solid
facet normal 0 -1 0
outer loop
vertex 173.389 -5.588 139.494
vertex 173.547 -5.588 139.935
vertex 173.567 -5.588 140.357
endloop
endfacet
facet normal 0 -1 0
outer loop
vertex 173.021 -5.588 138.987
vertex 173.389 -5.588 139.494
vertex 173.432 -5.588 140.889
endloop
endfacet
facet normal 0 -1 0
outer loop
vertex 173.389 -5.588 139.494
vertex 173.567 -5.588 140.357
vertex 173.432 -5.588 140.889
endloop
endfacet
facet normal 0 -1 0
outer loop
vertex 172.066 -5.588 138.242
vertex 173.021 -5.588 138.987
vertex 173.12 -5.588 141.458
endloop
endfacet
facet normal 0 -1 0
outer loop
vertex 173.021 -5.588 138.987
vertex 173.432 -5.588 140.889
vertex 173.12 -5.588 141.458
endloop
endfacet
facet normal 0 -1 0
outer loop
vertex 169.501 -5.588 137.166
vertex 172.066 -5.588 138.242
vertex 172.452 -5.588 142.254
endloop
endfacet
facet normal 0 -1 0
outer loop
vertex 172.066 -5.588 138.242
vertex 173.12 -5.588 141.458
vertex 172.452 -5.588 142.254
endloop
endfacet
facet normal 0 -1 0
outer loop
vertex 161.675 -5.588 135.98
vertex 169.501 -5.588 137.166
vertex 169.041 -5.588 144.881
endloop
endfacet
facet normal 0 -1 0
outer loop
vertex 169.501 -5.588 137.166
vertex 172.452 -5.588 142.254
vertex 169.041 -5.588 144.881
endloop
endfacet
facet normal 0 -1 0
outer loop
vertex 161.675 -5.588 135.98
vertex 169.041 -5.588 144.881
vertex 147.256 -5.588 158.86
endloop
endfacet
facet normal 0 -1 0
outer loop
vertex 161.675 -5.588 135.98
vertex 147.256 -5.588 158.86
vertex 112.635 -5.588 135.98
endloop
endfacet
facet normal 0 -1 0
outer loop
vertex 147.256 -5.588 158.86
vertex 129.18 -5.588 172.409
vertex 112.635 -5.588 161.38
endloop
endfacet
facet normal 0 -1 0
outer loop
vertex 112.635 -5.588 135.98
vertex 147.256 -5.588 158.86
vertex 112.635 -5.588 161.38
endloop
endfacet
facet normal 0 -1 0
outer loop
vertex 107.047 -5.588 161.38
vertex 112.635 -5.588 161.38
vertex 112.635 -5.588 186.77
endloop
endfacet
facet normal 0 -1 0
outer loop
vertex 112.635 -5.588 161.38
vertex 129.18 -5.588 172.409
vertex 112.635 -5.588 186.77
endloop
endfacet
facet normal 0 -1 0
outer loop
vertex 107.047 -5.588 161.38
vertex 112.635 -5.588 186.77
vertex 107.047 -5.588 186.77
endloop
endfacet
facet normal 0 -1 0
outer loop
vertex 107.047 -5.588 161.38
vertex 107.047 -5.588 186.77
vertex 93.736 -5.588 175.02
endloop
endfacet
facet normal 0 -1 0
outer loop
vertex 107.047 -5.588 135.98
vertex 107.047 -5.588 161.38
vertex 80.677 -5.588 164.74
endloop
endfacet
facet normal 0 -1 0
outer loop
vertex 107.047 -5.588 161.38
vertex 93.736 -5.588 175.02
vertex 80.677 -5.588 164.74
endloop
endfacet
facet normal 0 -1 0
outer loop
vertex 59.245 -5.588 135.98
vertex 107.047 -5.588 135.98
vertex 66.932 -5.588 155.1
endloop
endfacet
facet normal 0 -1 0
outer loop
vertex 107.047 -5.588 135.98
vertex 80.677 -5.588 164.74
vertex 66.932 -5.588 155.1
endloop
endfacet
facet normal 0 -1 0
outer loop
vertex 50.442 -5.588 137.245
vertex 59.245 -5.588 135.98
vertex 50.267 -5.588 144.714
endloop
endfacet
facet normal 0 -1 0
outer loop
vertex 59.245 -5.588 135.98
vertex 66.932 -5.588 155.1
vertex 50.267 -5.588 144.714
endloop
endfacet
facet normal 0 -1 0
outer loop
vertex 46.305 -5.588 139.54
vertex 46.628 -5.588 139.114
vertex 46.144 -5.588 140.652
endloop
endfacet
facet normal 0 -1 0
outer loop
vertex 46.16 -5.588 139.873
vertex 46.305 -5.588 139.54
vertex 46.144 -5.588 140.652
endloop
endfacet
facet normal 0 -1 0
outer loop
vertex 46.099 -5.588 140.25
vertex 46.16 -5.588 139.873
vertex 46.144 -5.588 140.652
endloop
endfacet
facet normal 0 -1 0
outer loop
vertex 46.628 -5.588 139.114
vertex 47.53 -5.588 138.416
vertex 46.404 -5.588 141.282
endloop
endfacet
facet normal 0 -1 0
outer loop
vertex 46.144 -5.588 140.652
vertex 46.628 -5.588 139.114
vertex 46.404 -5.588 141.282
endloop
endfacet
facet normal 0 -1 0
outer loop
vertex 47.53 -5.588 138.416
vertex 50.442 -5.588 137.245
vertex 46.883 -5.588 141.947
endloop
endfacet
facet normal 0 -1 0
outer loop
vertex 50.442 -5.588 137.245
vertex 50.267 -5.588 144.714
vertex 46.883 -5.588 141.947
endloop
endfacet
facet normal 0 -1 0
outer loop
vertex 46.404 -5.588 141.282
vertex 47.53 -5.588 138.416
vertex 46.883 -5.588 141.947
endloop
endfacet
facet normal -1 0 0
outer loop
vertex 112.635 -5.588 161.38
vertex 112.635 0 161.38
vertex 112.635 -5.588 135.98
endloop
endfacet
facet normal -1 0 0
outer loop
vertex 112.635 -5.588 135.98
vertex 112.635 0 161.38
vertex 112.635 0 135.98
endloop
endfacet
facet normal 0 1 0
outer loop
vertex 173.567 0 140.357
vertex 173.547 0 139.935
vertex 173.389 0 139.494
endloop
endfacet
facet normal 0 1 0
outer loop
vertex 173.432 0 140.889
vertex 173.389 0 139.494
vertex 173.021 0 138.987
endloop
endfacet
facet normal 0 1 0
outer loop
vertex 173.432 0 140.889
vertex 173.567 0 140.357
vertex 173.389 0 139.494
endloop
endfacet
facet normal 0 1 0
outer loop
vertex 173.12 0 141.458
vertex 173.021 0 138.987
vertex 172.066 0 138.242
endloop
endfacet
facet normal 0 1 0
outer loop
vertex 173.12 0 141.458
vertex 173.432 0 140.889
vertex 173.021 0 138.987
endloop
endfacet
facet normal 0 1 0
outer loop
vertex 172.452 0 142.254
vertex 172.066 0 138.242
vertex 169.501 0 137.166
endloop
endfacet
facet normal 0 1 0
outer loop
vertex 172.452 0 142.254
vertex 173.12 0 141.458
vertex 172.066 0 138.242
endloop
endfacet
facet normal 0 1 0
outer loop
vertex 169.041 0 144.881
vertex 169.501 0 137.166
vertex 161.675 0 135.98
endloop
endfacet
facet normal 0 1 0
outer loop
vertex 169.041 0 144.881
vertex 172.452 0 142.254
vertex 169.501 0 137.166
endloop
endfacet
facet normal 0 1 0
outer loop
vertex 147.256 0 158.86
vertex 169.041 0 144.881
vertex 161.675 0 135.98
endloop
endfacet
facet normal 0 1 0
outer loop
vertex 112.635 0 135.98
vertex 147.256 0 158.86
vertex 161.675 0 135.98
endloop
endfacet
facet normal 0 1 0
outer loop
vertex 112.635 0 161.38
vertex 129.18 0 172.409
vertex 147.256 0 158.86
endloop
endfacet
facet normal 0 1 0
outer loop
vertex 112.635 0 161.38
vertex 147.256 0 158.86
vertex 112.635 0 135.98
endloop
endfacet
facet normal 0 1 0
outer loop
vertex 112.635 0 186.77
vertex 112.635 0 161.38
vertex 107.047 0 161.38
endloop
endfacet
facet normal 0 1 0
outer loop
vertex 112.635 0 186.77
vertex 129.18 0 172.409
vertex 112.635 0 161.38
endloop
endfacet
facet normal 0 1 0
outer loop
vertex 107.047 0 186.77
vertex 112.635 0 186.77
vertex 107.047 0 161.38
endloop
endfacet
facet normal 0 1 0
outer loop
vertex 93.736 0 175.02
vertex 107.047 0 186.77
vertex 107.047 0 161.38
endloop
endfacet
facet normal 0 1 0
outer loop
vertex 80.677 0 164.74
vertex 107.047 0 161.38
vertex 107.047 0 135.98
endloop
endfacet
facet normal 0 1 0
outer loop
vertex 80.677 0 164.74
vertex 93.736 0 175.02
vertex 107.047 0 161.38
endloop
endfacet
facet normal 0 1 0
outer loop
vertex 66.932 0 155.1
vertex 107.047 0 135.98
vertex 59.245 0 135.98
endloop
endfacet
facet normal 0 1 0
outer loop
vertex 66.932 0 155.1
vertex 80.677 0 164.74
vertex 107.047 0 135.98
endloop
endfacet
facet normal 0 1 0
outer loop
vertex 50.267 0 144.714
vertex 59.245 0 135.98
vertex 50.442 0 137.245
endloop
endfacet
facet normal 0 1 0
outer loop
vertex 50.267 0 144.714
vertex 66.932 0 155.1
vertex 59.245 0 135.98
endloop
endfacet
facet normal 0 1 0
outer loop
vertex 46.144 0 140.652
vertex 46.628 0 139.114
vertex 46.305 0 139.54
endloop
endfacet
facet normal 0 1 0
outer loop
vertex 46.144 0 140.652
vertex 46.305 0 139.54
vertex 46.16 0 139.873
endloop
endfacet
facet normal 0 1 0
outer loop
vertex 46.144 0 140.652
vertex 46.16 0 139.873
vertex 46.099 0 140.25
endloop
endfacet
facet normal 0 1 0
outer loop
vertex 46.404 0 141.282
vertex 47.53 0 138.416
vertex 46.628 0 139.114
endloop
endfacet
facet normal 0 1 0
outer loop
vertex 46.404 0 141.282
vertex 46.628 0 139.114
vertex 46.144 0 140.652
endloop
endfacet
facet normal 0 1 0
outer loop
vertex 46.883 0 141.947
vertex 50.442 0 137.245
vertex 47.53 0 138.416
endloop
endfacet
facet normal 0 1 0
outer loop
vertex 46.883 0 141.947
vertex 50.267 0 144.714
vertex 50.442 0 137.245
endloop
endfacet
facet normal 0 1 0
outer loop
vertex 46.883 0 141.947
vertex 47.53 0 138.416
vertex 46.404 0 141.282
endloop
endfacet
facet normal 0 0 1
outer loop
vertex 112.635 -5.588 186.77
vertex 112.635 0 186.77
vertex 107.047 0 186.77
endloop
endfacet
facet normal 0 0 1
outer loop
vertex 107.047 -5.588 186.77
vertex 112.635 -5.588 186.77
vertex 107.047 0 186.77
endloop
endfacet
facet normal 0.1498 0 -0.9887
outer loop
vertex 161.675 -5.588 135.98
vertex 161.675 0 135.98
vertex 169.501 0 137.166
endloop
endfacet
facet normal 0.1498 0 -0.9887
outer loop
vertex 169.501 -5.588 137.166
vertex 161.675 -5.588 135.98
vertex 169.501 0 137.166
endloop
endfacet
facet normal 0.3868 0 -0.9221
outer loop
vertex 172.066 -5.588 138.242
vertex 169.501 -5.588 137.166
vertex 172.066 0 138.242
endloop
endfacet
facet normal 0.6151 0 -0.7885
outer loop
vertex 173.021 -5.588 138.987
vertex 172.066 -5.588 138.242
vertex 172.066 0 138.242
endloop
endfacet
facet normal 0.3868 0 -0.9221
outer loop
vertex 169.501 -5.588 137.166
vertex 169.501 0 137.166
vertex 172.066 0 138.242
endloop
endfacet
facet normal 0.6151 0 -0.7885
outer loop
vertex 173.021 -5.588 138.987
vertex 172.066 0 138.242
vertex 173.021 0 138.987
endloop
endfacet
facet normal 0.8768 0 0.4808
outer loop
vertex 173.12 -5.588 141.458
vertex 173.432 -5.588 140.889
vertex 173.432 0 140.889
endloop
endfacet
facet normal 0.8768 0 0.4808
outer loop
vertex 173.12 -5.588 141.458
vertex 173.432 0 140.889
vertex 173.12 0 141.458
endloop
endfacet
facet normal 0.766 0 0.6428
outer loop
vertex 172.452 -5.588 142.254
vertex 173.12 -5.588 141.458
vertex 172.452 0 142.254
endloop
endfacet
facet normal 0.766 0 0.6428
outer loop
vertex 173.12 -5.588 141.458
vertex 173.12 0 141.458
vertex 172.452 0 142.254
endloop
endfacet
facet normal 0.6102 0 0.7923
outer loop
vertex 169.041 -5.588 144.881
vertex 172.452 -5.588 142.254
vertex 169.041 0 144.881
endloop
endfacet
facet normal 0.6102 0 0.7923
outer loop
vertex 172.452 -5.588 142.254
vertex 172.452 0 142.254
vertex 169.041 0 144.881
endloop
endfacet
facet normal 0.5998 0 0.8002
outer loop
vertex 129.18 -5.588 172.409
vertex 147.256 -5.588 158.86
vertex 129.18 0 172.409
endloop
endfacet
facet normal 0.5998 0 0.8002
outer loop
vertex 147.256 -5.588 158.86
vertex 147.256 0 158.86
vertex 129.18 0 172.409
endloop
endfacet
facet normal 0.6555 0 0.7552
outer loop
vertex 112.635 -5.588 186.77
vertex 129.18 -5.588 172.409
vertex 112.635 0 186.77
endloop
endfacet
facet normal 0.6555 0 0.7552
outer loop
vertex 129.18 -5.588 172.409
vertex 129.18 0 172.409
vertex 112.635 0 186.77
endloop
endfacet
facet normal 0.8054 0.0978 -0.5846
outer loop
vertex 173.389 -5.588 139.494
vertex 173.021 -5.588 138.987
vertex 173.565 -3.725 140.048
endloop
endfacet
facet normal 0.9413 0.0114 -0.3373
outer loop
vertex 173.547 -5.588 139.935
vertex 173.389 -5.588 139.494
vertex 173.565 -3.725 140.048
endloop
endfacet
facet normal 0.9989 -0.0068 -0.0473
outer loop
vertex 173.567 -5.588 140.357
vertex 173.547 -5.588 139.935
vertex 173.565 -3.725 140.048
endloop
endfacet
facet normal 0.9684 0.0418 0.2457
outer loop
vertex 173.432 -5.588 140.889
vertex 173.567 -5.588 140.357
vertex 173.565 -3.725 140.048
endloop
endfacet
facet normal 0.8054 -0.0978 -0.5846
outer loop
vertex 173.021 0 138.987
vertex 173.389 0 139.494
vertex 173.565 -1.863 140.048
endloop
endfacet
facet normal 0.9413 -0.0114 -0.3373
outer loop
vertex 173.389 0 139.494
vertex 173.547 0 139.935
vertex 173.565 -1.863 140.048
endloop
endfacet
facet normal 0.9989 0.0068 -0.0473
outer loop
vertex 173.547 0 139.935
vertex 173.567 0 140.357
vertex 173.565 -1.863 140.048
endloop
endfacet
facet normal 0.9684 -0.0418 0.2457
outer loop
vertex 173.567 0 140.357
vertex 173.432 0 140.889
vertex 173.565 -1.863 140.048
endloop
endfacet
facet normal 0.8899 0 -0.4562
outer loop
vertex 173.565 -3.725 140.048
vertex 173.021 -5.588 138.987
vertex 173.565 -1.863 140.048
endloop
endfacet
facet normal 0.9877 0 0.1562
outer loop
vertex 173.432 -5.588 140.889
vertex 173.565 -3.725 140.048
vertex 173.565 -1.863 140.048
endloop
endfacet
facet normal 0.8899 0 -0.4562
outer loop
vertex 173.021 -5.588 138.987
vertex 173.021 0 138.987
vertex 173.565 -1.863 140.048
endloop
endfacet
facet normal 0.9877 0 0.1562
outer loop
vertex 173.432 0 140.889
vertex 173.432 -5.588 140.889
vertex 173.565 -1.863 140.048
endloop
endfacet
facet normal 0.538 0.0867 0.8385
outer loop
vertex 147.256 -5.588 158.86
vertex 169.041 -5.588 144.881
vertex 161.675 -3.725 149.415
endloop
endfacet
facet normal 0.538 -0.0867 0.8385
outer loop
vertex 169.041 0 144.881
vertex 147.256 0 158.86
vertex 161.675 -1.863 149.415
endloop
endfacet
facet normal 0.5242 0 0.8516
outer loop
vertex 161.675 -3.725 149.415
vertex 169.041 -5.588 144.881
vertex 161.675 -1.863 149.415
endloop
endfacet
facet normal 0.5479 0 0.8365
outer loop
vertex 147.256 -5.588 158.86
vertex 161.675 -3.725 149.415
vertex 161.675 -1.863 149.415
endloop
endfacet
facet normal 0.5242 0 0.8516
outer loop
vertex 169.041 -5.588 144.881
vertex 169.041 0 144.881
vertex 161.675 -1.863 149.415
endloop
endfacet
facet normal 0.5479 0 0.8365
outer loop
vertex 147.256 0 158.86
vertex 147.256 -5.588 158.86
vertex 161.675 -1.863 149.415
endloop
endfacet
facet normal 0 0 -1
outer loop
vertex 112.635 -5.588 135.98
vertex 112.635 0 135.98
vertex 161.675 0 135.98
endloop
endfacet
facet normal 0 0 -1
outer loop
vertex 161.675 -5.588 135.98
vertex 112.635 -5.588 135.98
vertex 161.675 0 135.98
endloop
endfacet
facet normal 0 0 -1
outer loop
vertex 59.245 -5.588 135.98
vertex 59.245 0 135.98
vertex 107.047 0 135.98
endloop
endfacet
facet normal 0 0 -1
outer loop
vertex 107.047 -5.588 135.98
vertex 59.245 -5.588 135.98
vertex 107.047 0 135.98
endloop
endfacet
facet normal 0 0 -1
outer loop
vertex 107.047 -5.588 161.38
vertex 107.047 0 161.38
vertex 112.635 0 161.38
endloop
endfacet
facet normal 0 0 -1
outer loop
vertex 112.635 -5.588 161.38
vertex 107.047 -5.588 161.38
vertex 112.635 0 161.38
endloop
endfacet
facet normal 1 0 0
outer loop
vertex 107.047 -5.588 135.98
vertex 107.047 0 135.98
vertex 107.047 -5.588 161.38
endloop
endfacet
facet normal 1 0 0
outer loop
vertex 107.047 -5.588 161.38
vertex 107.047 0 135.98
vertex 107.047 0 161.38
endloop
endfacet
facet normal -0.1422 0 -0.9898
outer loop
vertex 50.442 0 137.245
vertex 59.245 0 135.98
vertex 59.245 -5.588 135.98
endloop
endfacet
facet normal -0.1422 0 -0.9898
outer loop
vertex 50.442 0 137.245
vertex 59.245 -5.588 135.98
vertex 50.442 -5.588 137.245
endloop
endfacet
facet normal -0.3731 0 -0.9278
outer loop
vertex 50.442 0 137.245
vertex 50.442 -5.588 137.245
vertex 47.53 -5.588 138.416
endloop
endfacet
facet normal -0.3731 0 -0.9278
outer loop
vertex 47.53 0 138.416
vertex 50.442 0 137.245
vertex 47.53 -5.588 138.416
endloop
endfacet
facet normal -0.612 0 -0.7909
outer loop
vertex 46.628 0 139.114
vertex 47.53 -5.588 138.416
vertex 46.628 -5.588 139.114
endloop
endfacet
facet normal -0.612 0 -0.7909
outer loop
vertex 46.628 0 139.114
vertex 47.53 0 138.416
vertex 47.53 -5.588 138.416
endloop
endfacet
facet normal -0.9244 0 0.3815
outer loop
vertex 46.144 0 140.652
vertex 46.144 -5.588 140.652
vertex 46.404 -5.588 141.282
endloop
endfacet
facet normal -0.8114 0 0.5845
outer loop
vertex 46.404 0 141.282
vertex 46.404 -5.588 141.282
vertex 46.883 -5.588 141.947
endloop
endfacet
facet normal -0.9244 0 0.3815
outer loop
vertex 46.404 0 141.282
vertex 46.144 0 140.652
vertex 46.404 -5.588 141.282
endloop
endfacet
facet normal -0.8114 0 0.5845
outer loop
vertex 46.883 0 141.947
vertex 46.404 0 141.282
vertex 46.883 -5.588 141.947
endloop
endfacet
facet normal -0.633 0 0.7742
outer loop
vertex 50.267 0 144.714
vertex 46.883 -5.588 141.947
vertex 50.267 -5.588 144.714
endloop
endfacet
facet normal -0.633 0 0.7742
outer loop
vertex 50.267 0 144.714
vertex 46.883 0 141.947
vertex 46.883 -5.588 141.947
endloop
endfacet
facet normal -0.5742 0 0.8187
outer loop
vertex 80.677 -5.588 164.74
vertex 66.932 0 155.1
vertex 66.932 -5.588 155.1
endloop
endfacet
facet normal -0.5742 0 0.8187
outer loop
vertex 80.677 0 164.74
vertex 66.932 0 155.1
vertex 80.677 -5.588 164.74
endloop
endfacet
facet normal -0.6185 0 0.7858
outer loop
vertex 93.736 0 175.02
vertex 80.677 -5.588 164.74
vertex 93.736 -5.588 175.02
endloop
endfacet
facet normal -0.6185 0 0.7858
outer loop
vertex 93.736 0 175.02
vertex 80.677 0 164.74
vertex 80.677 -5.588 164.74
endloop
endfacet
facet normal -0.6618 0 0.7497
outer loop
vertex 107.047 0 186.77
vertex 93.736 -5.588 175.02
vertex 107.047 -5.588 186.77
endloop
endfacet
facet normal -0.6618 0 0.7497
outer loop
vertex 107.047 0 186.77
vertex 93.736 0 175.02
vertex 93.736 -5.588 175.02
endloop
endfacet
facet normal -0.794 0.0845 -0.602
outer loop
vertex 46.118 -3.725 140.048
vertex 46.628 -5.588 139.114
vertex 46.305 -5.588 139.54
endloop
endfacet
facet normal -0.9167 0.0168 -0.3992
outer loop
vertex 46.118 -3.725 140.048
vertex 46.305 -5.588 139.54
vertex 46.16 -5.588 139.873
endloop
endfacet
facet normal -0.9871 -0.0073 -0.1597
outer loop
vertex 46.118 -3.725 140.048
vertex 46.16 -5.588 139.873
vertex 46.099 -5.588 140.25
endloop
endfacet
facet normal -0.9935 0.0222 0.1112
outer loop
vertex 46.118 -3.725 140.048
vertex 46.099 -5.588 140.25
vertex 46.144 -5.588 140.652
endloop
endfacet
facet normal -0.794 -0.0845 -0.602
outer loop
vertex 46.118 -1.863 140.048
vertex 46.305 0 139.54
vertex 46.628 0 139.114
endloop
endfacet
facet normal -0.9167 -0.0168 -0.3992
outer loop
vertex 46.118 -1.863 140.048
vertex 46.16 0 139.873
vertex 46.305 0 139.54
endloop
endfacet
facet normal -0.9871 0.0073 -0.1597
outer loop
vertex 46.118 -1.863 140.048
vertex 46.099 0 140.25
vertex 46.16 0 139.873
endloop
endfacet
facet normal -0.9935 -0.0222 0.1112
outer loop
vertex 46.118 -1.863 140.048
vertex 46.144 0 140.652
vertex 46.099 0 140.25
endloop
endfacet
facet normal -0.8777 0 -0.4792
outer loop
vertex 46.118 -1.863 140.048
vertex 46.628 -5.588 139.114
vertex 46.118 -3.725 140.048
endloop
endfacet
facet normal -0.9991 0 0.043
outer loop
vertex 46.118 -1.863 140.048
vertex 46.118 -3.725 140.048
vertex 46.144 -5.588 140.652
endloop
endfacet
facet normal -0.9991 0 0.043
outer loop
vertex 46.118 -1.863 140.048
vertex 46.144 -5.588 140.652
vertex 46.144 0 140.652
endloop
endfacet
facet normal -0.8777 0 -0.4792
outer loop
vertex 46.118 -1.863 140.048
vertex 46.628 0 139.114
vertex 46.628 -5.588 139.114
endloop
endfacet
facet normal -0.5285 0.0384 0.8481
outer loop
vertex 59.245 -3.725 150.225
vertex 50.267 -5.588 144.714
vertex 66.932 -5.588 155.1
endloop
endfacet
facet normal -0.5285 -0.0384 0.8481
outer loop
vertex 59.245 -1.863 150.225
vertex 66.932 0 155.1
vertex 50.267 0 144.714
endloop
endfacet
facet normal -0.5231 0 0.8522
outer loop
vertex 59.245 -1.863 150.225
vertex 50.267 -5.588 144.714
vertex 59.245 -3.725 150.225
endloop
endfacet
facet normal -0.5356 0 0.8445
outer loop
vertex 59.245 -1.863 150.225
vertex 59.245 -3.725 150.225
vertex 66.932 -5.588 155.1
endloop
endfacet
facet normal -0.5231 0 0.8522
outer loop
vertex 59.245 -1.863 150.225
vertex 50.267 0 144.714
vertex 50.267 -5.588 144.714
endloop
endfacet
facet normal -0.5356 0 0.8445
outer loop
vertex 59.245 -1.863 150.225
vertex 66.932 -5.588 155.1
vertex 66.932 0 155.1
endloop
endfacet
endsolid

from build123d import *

# Parameters (mm, degrees)
F1_DEPTH = 5.588


with BuildPart() as f1:
    # F0 (on Front) → F1 (new body)
    with BuildSketch(Plane.XZ):
        with BuildLine():
            add(Edge.make_bspline(
                [(59.2453815043, 135.979577899), (52.4327556863, 136.2949171435), (39.9709976325, 139.4898068104), (63.9913458796, 152.1116502589), (90.2434246222, 171.0211149335), (107.0472194433, 186.7697834969)],
                knots=[0, 0, 0, 0, 0.2385633235, 0.5008288966, 1, 1, 1, 1], degree=3))
            Line((59.2453815043, 135.979577899), (107.0472194433, 135.979577899))
            Line((107.0472194433, 135.979577899), (107.0472194433, 161.379577899))
            Line((107.0472194433, 161.379577899), (112.6352194433, 161.379577899))
            Line((112.6352194433, 161.379577899), (112.6352194433, 135.979577899))
            Line((112.6352194433, 135.979577899), (161.6750980084, 135.979577899))
            add(Edge.make_bspline(
                [(161.6750980084, 135.979577899), (168.2971610007, 136.2860964716), (178.8323776641, 139.7062489389), (157.2734114026, 151.2672606436), (129.9250364204, 170.5656105709), (112.6352194433, 186.7697834969)],
                knots=[0, 0, 0, 0, 0.2318902282, 0.4863911926, 1, 1, 1, 1], degree=3))
            Line((112.6352194433, 186.7697834969), (107.0472194433, 186.7697834969))
        make_face()
    extrude(amount=F1_DEPTH)


solid = f1.part
